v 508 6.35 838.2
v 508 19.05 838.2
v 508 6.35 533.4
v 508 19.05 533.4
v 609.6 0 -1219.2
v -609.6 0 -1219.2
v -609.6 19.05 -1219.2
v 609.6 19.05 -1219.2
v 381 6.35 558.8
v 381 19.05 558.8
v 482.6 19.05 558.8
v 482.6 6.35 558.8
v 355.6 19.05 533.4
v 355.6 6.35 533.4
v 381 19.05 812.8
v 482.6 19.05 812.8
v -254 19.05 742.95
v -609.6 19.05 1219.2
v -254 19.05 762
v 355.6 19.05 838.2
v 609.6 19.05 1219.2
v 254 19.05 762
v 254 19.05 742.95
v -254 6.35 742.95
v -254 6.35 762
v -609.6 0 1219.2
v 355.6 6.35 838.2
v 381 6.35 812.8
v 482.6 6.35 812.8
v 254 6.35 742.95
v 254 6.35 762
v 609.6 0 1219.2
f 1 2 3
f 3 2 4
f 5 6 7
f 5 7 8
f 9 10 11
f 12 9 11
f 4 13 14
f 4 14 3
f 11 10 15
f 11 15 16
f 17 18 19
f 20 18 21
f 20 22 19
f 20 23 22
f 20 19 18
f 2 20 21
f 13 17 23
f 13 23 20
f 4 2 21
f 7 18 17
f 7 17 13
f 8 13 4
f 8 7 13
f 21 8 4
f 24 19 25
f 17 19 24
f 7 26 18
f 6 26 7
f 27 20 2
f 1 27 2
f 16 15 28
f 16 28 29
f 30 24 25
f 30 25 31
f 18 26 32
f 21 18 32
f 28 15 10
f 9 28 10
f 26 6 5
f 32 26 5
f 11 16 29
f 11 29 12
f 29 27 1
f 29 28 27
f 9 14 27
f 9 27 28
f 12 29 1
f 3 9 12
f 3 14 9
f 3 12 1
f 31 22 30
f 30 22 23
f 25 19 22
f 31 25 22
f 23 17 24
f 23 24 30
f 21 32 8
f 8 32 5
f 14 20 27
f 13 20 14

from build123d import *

# Parameters (mm, degrees)
SKETCH1_W           = 1219.2
SKETCH1_H           = 2438.4
BOSS_EXTRUDE1_DEPTH = 19.05
SKETCH2_W           = 152.4
SKETCH2_H           = 304.8
SKETCH2_W_2         = 101.6
SKETCH2_H_2         = 254
CUT_EXTRUDE1_DEPTH  = 12.7
SKETCH3_W           = 508
SKETCH3_H           = 19.05
CUT_EXTRUDE2_DEPTH  = 12.7


with BuildPart() as part:
    # Sketch1 → Boss-Extrude1 (new body)
    with BuildSketch(Plane(origin=(0, 0, 0), x_dir=(1, 0, 0), z_dir=(0, 1, 0))):
        Rectangle(SKETCH1_W, SKETCH1_H)
    extrude(amount=BOSS_EXTRUDE1_DEPTH)

    # Sketch2 → Cut-Extrude1 (cut)
    with BuildSketch(Plane(origin=(0, 19.05, 0), x_dir=(1, 0, 0), z_dir=(0, 1, 0))):
        with Locations((431.8, -685.8)):
            Rectangle(SKETCH2_W, SKETCH2_H)
        with Locations((431.8, -685.8)):
            Rectangle(SKETCH2_W_2, SKETCH2_H_2, mode=Mode.SUBTRACT)
    extrude(amount=-CUT_EXTRUDE1_DEPTH, mode=Mode.SUBTRACT)

    # Sketch3 → Cut-Extrude2 (cut)
    with BuildSketch(Plane(origin=(0, 19.05, 0), x_dir=(1, 0, 0), z_dir=(0, 1, 0))):
        with Locations((0, -752.475)):
            Rectangle(SKETCH3_W, SKETCH3_H)
    extrude(amount=-CUT_EXTRUDE2_DEPTH, mode=Mode.SUBTRACT)


solid = part.part
